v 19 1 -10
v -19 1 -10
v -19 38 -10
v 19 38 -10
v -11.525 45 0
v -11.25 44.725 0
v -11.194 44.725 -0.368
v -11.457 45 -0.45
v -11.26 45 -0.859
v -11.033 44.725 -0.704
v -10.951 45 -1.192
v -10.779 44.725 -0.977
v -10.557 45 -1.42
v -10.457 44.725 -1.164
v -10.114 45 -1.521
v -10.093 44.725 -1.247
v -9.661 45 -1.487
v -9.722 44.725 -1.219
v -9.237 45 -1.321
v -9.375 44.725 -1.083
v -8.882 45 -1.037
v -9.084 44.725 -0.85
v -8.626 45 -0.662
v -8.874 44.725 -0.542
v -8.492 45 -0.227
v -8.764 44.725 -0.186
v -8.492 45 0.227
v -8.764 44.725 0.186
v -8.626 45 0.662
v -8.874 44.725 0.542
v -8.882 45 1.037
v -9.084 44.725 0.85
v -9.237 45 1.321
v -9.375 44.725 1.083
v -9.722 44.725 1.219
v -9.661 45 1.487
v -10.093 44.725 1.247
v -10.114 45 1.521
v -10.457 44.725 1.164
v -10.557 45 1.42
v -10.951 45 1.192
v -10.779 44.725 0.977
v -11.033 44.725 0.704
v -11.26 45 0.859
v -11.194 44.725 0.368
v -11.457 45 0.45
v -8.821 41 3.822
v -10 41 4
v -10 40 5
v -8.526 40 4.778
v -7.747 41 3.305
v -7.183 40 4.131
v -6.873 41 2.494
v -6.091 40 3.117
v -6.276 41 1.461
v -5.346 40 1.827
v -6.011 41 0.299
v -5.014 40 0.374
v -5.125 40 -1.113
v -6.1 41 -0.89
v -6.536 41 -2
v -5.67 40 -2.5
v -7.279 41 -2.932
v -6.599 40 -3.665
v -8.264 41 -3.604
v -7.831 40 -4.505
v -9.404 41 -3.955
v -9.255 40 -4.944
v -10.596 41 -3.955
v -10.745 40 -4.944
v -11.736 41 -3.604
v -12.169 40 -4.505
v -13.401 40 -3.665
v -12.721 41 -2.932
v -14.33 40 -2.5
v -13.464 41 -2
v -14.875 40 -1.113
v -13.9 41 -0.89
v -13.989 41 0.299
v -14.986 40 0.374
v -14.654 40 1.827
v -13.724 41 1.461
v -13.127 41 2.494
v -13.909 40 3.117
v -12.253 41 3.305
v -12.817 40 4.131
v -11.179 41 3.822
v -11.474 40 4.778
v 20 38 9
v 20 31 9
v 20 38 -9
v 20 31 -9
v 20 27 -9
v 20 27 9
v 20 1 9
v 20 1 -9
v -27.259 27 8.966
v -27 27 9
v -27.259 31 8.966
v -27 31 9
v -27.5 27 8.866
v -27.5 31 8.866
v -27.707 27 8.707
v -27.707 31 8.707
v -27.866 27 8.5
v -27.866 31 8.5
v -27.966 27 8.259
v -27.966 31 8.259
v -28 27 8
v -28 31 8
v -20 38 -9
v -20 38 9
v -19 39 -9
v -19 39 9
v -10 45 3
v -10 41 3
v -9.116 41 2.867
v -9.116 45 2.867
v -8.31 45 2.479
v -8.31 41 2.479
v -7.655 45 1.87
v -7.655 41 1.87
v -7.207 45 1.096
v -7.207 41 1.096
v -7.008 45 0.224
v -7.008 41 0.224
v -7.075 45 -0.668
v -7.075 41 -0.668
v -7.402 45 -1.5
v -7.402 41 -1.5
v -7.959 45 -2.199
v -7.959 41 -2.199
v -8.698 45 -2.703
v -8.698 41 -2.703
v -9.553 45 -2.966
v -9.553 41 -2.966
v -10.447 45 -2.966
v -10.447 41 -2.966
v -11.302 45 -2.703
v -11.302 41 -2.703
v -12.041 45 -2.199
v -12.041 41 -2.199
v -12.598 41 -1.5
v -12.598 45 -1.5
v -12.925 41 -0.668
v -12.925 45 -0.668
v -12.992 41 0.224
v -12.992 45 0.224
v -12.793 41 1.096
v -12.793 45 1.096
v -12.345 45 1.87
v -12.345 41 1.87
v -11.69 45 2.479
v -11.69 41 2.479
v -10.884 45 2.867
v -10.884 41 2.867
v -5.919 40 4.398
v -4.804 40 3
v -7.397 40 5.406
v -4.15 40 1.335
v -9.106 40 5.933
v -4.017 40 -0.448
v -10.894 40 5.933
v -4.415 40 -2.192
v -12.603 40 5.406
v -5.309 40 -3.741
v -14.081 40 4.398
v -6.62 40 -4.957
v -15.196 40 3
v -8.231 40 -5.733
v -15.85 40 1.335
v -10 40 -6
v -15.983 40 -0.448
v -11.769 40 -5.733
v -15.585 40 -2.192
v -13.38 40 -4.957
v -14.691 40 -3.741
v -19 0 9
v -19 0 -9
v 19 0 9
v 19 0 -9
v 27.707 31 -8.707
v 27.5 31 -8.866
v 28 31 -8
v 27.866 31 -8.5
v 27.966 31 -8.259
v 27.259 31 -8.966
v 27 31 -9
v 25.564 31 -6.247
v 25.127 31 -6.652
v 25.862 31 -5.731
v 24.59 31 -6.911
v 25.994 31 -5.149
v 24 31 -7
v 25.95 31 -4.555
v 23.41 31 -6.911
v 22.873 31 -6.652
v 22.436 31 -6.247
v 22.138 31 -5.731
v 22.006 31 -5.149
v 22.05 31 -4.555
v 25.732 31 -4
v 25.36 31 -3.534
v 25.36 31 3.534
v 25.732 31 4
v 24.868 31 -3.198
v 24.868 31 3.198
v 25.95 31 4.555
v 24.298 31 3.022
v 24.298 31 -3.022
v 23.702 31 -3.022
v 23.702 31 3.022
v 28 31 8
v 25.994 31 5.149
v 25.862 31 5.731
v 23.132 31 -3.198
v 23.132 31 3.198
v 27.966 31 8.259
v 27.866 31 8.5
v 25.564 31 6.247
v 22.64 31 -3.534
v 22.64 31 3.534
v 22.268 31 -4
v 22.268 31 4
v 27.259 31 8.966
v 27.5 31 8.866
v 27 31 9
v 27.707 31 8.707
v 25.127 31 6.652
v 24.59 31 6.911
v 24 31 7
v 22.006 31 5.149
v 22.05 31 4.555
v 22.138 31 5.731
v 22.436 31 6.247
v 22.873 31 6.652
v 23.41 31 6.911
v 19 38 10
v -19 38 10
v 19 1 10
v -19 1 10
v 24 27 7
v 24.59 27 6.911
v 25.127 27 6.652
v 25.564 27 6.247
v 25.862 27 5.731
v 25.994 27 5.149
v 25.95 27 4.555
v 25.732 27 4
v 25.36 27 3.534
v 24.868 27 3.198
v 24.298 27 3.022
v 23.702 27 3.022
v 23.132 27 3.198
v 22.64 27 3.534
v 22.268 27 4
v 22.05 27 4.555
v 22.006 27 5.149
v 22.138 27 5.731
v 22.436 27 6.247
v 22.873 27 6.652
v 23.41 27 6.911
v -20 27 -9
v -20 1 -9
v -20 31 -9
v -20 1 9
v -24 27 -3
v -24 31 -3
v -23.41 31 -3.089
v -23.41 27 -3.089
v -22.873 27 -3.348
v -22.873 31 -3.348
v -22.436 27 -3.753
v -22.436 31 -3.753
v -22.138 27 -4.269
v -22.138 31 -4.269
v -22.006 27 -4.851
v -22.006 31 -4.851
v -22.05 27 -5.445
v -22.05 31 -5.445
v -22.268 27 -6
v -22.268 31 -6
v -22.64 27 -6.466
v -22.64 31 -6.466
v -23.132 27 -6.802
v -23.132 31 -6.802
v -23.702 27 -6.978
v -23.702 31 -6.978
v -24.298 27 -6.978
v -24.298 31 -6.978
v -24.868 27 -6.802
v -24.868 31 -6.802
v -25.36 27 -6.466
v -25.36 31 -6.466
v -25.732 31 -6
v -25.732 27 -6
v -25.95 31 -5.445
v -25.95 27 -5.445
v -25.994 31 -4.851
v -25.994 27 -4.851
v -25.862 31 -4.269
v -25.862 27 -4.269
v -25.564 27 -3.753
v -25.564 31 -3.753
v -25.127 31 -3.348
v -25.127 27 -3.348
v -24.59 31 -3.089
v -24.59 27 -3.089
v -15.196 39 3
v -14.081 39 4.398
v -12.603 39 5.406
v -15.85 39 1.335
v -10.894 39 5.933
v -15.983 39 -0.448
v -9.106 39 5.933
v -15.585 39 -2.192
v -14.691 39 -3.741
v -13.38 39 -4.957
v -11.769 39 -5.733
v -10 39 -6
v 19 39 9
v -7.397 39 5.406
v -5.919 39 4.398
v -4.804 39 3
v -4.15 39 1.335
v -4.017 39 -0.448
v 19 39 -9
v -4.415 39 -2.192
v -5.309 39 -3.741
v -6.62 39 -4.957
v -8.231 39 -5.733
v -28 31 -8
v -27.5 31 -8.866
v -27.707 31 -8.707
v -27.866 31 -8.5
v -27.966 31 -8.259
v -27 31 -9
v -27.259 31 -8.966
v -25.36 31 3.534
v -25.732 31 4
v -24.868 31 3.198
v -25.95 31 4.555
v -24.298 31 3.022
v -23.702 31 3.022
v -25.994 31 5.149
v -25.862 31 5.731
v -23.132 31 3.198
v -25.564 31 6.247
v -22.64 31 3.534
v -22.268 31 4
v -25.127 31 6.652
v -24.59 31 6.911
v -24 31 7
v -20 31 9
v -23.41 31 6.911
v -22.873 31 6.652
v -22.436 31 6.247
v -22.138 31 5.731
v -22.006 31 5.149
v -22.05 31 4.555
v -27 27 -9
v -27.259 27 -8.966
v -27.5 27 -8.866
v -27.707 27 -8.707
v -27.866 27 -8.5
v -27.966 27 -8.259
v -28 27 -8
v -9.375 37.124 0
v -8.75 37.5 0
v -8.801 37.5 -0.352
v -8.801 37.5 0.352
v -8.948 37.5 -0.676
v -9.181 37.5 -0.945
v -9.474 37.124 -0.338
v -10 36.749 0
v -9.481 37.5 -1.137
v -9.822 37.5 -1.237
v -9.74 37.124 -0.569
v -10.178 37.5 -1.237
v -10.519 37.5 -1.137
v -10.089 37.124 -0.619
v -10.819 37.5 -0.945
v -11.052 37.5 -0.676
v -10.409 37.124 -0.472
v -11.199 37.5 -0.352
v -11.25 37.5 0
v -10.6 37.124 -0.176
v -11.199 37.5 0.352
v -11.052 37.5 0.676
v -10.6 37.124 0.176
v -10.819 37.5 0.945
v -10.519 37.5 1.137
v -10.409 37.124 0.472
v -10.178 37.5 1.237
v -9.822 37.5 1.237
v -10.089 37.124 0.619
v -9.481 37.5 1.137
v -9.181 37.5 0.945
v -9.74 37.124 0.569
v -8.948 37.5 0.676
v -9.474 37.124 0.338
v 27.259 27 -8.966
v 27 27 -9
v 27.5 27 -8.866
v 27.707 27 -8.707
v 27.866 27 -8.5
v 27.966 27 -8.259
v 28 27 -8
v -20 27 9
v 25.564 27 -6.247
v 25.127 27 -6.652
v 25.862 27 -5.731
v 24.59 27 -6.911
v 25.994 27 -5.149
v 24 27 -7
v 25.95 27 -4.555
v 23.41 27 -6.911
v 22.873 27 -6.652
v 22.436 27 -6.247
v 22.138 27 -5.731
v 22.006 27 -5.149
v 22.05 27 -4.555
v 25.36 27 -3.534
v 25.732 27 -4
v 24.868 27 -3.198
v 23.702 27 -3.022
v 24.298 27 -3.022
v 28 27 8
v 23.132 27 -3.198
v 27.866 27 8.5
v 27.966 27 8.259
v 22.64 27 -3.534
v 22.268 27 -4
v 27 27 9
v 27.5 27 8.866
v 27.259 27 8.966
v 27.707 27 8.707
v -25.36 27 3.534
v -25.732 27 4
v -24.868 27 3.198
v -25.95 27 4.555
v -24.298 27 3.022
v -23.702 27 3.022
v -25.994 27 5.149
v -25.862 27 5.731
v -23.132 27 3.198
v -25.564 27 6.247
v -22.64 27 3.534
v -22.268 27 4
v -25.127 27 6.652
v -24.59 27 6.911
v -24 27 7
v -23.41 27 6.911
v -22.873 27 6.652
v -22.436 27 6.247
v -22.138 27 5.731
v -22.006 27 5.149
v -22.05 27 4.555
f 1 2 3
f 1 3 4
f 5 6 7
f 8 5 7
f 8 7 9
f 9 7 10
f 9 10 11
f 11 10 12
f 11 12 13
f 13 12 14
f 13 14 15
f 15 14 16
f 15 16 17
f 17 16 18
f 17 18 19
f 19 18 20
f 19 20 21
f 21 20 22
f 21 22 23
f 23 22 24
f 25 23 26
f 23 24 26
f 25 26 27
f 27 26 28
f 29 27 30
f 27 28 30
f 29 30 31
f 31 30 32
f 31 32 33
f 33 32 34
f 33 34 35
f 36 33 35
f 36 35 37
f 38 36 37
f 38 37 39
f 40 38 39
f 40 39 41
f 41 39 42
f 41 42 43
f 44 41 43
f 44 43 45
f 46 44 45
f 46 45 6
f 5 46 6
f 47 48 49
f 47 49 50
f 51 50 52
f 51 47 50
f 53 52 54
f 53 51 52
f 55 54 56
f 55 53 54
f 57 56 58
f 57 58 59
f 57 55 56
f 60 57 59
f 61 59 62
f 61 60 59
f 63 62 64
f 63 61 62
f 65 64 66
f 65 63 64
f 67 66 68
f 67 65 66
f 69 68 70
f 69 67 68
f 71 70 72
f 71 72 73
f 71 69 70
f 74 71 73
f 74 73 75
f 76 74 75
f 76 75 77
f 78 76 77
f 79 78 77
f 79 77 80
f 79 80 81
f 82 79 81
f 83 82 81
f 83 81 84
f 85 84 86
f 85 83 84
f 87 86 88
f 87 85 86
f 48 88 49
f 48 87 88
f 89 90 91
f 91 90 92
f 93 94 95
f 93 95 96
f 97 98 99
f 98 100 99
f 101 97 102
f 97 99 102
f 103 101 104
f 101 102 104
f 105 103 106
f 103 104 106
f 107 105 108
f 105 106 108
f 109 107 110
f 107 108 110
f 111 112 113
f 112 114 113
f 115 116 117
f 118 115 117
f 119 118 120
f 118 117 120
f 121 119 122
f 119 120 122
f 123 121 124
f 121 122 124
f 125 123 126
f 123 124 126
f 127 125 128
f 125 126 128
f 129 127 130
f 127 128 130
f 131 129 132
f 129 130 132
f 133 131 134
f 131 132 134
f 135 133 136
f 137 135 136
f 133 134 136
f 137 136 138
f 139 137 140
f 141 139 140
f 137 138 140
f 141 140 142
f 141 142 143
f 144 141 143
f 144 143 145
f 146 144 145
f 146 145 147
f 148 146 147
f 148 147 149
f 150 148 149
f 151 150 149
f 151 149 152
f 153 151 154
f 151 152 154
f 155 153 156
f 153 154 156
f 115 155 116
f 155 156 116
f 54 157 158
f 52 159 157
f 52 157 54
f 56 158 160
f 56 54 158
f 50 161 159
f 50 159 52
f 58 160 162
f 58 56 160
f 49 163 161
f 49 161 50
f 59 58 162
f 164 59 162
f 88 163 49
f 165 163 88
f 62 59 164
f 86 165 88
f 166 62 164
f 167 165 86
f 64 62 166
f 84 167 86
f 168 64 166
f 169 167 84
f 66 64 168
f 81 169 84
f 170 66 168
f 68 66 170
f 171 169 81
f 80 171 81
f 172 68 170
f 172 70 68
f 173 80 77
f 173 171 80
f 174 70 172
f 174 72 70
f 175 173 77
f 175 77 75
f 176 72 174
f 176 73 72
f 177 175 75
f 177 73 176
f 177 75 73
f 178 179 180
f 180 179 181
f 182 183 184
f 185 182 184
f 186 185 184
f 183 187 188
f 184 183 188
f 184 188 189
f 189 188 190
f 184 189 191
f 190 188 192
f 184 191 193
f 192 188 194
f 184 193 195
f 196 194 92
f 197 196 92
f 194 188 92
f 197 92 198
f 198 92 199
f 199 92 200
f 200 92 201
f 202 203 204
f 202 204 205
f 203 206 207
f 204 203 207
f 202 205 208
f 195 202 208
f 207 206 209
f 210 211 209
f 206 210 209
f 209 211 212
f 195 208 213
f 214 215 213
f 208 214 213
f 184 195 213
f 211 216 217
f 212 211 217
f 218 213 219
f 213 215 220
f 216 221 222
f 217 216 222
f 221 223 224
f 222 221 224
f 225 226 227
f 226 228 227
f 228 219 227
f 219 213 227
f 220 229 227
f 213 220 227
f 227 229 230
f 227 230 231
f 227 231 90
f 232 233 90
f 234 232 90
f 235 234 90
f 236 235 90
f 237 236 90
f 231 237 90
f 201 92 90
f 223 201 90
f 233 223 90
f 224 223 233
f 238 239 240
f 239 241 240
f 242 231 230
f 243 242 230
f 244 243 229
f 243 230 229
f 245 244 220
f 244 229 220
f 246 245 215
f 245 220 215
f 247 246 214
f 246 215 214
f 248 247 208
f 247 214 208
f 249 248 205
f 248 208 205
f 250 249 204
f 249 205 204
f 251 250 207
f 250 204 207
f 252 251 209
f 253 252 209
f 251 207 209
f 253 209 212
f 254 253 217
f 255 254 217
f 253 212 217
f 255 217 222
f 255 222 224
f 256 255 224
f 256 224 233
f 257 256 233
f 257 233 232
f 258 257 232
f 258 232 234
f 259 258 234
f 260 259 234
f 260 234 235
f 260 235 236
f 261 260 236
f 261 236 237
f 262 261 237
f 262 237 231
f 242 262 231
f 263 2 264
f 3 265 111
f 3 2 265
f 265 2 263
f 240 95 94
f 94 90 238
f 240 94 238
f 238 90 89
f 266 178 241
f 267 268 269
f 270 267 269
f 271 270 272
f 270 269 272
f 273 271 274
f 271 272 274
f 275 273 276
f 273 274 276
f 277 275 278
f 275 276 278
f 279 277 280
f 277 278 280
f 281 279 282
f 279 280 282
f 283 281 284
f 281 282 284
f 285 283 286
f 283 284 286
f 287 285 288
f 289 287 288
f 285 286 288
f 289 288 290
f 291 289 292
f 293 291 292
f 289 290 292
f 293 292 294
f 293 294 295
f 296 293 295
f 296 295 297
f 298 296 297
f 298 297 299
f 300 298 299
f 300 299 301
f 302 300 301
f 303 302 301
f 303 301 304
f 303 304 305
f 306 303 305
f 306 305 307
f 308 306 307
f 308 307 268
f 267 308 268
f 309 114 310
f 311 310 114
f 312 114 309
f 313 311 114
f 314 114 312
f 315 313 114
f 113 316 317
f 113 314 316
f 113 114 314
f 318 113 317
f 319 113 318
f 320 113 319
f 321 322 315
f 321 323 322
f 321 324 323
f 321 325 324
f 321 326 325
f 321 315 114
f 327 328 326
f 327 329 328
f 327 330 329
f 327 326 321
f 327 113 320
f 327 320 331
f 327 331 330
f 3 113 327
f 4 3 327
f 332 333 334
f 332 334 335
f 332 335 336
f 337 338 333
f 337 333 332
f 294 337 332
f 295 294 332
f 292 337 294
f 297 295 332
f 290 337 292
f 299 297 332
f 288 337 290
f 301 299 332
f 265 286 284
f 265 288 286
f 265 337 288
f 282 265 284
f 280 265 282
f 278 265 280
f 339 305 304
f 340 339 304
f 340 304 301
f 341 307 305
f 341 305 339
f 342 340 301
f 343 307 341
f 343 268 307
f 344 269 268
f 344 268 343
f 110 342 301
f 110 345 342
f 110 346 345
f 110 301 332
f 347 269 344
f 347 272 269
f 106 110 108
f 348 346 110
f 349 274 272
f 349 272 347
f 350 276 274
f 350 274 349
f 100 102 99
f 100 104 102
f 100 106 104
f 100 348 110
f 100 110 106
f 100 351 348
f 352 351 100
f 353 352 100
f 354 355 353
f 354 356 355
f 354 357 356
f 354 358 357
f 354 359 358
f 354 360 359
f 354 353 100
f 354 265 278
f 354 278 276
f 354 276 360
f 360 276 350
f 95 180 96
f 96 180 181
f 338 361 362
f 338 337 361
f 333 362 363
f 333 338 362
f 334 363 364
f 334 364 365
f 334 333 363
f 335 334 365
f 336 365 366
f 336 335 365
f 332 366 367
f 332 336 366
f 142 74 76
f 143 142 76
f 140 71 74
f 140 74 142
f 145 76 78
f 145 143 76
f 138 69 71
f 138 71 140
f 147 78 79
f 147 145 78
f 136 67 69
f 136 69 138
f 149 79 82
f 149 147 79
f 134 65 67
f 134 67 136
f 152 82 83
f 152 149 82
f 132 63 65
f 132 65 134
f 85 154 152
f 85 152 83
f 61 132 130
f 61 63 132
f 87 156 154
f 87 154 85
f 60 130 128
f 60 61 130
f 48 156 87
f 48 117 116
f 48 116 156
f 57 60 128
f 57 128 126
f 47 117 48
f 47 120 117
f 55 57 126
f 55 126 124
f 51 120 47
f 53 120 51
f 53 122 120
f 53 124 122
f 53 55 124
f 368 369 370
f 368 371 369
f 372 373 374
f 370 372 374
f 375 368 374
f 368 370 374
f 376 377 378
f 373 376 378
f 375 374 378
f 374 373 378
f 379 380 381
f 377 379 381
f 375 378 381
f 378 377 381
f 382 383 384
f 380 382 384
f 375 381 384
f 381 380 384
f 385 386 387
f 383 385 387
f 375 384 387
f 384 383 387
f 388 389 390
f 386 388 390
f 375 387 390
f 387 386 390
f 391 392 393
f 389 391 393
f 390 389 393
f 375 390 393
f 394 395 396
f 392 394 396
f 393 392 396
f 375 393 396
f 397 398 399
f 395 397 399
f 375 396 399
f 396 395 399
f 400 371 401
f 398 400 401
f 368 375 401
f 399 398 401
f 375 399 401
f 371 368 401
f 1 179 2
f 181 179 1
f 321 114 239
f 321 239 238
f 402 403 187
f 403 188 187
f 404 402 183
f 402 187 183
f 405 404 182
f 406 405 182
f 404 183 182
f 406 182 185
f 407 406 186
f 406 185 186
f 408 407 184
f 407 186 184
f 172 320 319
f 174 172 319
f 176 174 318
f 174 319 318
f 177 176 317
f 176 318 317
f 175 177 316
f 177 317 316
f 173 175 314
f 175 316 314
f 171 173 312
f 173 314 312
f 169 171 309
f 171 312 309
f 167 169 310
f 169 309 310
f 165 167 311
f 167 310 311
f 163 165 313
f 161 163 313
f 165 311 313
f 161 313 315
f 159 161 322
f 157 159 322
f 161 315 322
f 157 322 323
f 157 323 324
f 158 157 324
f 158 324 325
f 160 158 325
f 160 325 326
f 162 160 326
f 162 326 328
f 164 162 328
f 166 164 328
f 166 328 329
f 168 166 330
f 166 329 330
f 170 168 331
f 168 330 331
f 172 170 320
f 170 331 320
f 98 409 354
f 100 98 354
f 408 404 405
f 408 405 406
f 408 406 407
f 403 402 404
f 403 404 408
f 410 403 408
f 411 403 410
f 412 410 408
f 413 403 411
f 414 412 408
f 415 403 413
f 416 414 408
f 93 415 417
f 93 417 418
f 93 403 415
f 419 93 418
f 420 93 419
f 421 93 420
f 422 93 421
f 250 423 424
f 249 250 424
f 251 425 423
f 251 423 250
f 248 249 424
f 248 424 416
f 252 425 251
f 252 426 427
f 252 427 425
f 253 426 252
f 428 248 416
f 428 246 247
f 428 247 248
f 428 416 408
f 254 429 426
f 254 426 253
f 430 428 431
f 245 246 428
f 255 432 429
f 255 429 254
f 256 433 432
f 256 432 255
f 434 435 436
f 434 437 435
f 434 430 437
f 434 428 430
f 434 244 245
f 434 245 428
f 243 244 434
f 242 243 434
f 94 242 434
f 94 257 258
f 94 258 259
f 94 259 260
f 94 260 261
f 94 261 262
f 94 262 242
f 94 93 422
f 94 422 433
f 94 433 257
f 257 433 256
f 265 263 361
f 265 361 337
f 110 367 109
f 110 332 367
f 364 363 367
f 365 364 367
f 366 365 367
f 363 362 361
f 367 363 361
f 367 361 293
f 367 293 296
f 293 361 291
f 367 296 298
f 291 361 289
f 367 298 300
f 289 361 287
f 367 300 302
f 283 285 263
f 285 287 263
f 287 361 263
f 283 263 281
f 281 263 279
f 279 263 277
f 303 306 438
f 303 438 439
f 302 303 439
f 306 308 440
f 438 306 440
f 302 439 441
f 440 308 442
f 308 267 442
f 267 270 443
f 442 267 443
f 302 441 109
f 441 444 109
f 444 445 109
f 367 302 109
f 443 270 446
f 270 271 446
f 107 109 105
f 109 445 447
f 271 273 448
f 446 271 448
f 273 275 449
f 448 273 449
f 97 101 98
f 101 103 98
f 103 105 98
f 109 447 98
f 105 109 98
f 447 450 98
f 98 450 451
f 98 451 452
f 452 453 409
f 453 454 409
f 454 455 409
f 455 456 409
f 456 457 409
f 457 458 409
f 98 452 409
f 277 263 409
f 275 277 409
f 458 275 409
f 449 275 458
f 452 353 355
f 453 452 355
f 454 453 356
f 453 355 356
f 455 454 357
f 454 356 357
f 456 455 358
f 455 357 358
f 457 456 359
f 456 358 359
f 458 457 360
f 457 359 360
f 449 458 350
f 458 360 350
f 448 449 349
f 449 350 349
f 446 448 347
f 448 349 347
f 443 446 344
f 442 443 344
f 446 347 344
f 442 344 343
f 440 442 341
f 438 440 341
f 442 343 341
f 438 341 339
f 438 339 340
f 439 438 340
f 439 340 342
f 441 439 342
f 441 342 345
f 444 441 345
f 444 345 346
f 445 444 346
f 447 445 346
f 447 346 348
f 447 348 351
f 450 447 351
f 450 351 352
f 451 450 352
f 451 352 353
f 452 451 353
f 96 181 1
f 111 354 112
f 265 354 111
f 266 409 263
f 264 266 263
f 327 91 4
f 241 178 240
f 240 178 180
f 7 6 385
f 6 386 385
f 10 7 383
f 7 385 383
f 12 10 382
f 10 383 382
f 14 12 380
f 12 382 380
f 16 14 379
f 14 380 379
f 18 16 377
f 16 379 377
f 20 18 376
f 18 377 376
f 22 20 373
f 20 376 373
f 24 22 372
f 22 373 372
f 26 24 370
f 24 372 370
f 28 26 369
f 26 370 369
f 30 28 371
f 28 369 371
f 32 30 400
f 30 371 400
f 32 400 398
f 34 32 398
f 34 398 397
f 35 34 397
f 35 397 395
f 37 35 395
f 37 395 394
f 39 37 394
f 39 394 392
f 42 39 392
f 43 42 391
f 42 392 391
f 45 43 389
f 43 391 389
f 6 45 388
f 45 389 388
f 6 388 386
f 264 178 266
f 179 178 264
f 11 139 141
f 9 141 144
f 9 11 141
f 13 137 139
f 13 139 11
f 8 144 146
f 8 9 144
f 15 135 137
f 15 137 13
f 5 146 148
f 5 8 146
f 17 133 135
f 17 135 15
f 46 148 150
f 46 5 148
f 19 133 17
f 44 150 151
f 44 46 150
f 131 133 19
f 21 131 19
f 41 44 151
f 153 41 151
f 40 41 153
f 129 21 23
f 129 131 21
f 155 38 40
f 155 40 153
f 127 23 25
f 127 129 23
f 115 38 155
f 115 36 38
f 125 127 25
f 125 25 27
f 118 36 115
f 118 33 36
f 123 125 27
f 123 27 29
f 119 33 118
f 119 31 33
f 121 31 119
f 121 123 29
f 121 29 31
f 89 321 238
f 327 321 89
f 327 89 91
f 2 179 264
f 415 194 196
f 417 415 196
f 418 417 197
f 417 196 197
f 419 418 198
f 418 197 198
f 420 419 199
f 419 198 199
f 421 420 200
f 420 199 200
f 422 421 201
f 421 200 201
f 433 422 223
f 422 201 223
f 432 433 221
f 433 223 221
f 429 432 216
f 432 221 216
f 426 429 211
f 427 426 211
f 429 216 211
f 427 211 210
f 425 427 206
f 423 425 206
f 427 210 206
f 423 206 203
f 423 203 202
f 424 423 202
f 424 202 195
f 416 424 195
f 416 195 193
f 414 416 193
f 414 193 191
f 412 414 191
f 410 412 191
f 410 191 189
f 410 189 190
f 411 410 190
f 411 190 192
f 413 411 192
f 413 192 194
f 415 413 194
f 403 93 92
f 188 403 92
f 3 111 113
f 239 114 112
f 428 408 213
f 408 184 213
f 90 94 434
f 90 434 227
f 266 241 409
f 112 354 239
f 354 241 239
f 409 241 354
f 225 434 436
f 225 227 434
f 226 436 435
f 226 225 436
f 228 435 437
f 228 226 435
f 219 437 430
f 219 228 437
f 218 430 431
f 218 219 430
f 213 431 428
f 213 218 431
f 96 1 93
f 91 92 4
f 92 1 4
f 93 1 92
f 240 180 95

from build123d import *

# Parameters (mm, degrees)
SKETCH_1_W                   = 40
SKETCH_1_H                   = 20
EXTRUDE_1_DEPTH              = 39
CHAMFER_1_SIZE               = 1
SKETCH_12_W                  = 18
SKETCH_12_H                  = 4
EXTRUDE_7_DEPTH              = 8
SKETCH_13_R                  = 2
CUT_EXTRUDE_2_DEPTH          = 43.95346319
FILLET_3_R                   = 1
SKETCH_14_R                  = 6
EXTRUDE_8_DEPTH              = 1
SKETCH_15_R                  = 5
EXTRUDE_9_DEPTH              = 1
SKETCH_16_R                  = 3
EXTRUDE_10_DEPTH             = 4
HOLE_WIZARD_M3_2_D           = 2.5
HOLE_WIZARD_M3_2_DEPTH       = 7.5
HOLE_WIZARD_M3_2_CSINK_D     = 3.05
HOLE_WIZARD_M3_2_CSINK_ANGLE = 90
HOLE_WIZARD_M3_2_TIP         = 0.751075774
CHAMFER_3_SIZE               = 1


with BuildPart() as part:
    # 草图1 → 凸台-拉伸1 (new body)
    with BuildSketch(Plane(origin=(0, 0, 0), x_dir=(1, 0, 0), z_dir=(0, 1, 0))):
        Rectangle(SKETCH_1_W, SKETCH_1_H)
    extrude(amount=EXTRUDE_1_DEPTH)

    # 倒角1
    chamfer_1_edges = [part.edges().sort_by_distance(p)[0] for p in [
        (-20, 39, 0),
        (0, 39, 10),
        (20, 39, 0),
        (0, 0, 10),
        (-20, 0, 0),
        (0, 0, -10),
        (20, 0, 0),
        (20, 19.5, 10),
        (-20, 19.5, 10),
        (-20, 19.5, -10),
        (20, 19.5, -10),
        (0, 39, -10),
    ]]
    chamfer(chamfer_1_edges, length=CHAMFER_1_SIZE)

    # 草图12 → 凸台-拉伸7 (add)
    with BuildSketch(Plane.ZY.offset(20)):
        with Locations((0, 29)):
            Rectangle(SKETCH_12_W, SKETCH_12_H)
    extrude_7 = extrude(amount=EXTRUDE_7_DEPTH)

    # 镜向1: 凸台-拉伸7 across plane
    add(extrude_7.mirror(Plane(origin=(0, 0, 0), x_dir=(0, 0, 1), z_dir=(1, 0, 0))))

    # 草图13 → 切除-拉伸2 (cut, through all)
    with BuildSketch(Plane(origin=(0, 31, 0), x_dir=(1, 0, 0), z_dir=(0, 1, 0))):
        with Locations(Location((-24, 5, 0), (0, 0, 270))):
            Circle(SKETCH_13_R)
        with Locations(Location((-24, -5, 0), (0, 0, 270))):
            Circle(SKETCH_13_R)
        with Locations(Location((24, -5, 0), (0, 0, 270))):
            Circle(SKETCH_13_R)
        with Locations(Location((24, 5, 0), (0, 0, 90))):
            Circle(SKETCH_13_R)
    extrude(amount=-CUT_EXTRUDE_2_DEPTH, mode=Mode.SUBTRACT)

    # 圆角3
    fillet_3_edges = [part.edges().sort_by_distance(p)[0] for p in [
        (-28, 29, 9),
        (-28, 29, -9),
        (28, 29, 9),
        (28, 29, -9),
    ]]
    fillet(fillet_3_edges, radius=FILLET_3_R)

    # 草图14 → 凸台-拉伸8 (add)
    with BuildSketch(Plane(origin=(0, 39, 0), x_dir=(1, 0, 0), z_dir=(0, 1, 0))):
        with Locations(Location((-10, 0, 0), (0, 0, 90))):
            Circle(SKETCH_14_R)
    extrude(amount=EXTRUDE_8_DEPTH)

    # 草图15 → 凸台-拉伸9 (add)
    with BuildSketch(Plane(origin=(0, 40, 0), x_dir=(1, 0, 0), z_dir=(0, 1, 0))):
        with Locations(Location((-10, 0, 0), (0, 0, 270))):
            Circle(SKETCH_15_R)
    extrude(amount=EXTRUDE_9_DEPTH)

    # 草图16 → 凸台-拉伸10 (add)
    with BuildSketch(Plane(origin=(0, 41, 0), x_dir=(1, 0, 0), z_dir=(0, 1, 0))):
        with Locations(Location((-10, 0, 0), (0, 0, 270))):
            Circle(SKETCH_16_R)
    extrude(amount=EXTRUDE_10_DEPTH)

    # M3 螺纹孔2
    with Locations(Plane(origin=(0, 45, 0), x_dir=(1, 0, 0), z_dir=(0, 1, 0))):
        with Locations((-10, 0)):
            CounterSinkHole(HOLE_WIZARD_M3_2_D / 2, HOLE_WIZARD_M3_2_CSINK_D / 2, depth=HOLE_WIZARD_M3_2_DEPTH, counter_sink_angle=HOLE_WIZARD_M3_2_CSINK_ANGLE)
            with Locations((0, 0, -(HOLE_WIZARD_M3_2_DEPTH + HOLE_WIZARD_M3_2_TIP / 2))):  # 118° drill point
                Cone(0, HOLE_WIZARD_M3_2_D / 2, HOLE_WIZARD_M3_2_TIP, mode=Mode.SUBTRACT)

    # 倒角3
    chamfer_3_edges = [part.edges().sort_by_distance(p)[0] for p in [
        (-10, 41, -5),
    ]]
    chamfer(chamfer_3_edges, length=CHAMFER_3_SIZE - 0.0001)  # a hair under: the kernel refuses the full size


solid = part.part
